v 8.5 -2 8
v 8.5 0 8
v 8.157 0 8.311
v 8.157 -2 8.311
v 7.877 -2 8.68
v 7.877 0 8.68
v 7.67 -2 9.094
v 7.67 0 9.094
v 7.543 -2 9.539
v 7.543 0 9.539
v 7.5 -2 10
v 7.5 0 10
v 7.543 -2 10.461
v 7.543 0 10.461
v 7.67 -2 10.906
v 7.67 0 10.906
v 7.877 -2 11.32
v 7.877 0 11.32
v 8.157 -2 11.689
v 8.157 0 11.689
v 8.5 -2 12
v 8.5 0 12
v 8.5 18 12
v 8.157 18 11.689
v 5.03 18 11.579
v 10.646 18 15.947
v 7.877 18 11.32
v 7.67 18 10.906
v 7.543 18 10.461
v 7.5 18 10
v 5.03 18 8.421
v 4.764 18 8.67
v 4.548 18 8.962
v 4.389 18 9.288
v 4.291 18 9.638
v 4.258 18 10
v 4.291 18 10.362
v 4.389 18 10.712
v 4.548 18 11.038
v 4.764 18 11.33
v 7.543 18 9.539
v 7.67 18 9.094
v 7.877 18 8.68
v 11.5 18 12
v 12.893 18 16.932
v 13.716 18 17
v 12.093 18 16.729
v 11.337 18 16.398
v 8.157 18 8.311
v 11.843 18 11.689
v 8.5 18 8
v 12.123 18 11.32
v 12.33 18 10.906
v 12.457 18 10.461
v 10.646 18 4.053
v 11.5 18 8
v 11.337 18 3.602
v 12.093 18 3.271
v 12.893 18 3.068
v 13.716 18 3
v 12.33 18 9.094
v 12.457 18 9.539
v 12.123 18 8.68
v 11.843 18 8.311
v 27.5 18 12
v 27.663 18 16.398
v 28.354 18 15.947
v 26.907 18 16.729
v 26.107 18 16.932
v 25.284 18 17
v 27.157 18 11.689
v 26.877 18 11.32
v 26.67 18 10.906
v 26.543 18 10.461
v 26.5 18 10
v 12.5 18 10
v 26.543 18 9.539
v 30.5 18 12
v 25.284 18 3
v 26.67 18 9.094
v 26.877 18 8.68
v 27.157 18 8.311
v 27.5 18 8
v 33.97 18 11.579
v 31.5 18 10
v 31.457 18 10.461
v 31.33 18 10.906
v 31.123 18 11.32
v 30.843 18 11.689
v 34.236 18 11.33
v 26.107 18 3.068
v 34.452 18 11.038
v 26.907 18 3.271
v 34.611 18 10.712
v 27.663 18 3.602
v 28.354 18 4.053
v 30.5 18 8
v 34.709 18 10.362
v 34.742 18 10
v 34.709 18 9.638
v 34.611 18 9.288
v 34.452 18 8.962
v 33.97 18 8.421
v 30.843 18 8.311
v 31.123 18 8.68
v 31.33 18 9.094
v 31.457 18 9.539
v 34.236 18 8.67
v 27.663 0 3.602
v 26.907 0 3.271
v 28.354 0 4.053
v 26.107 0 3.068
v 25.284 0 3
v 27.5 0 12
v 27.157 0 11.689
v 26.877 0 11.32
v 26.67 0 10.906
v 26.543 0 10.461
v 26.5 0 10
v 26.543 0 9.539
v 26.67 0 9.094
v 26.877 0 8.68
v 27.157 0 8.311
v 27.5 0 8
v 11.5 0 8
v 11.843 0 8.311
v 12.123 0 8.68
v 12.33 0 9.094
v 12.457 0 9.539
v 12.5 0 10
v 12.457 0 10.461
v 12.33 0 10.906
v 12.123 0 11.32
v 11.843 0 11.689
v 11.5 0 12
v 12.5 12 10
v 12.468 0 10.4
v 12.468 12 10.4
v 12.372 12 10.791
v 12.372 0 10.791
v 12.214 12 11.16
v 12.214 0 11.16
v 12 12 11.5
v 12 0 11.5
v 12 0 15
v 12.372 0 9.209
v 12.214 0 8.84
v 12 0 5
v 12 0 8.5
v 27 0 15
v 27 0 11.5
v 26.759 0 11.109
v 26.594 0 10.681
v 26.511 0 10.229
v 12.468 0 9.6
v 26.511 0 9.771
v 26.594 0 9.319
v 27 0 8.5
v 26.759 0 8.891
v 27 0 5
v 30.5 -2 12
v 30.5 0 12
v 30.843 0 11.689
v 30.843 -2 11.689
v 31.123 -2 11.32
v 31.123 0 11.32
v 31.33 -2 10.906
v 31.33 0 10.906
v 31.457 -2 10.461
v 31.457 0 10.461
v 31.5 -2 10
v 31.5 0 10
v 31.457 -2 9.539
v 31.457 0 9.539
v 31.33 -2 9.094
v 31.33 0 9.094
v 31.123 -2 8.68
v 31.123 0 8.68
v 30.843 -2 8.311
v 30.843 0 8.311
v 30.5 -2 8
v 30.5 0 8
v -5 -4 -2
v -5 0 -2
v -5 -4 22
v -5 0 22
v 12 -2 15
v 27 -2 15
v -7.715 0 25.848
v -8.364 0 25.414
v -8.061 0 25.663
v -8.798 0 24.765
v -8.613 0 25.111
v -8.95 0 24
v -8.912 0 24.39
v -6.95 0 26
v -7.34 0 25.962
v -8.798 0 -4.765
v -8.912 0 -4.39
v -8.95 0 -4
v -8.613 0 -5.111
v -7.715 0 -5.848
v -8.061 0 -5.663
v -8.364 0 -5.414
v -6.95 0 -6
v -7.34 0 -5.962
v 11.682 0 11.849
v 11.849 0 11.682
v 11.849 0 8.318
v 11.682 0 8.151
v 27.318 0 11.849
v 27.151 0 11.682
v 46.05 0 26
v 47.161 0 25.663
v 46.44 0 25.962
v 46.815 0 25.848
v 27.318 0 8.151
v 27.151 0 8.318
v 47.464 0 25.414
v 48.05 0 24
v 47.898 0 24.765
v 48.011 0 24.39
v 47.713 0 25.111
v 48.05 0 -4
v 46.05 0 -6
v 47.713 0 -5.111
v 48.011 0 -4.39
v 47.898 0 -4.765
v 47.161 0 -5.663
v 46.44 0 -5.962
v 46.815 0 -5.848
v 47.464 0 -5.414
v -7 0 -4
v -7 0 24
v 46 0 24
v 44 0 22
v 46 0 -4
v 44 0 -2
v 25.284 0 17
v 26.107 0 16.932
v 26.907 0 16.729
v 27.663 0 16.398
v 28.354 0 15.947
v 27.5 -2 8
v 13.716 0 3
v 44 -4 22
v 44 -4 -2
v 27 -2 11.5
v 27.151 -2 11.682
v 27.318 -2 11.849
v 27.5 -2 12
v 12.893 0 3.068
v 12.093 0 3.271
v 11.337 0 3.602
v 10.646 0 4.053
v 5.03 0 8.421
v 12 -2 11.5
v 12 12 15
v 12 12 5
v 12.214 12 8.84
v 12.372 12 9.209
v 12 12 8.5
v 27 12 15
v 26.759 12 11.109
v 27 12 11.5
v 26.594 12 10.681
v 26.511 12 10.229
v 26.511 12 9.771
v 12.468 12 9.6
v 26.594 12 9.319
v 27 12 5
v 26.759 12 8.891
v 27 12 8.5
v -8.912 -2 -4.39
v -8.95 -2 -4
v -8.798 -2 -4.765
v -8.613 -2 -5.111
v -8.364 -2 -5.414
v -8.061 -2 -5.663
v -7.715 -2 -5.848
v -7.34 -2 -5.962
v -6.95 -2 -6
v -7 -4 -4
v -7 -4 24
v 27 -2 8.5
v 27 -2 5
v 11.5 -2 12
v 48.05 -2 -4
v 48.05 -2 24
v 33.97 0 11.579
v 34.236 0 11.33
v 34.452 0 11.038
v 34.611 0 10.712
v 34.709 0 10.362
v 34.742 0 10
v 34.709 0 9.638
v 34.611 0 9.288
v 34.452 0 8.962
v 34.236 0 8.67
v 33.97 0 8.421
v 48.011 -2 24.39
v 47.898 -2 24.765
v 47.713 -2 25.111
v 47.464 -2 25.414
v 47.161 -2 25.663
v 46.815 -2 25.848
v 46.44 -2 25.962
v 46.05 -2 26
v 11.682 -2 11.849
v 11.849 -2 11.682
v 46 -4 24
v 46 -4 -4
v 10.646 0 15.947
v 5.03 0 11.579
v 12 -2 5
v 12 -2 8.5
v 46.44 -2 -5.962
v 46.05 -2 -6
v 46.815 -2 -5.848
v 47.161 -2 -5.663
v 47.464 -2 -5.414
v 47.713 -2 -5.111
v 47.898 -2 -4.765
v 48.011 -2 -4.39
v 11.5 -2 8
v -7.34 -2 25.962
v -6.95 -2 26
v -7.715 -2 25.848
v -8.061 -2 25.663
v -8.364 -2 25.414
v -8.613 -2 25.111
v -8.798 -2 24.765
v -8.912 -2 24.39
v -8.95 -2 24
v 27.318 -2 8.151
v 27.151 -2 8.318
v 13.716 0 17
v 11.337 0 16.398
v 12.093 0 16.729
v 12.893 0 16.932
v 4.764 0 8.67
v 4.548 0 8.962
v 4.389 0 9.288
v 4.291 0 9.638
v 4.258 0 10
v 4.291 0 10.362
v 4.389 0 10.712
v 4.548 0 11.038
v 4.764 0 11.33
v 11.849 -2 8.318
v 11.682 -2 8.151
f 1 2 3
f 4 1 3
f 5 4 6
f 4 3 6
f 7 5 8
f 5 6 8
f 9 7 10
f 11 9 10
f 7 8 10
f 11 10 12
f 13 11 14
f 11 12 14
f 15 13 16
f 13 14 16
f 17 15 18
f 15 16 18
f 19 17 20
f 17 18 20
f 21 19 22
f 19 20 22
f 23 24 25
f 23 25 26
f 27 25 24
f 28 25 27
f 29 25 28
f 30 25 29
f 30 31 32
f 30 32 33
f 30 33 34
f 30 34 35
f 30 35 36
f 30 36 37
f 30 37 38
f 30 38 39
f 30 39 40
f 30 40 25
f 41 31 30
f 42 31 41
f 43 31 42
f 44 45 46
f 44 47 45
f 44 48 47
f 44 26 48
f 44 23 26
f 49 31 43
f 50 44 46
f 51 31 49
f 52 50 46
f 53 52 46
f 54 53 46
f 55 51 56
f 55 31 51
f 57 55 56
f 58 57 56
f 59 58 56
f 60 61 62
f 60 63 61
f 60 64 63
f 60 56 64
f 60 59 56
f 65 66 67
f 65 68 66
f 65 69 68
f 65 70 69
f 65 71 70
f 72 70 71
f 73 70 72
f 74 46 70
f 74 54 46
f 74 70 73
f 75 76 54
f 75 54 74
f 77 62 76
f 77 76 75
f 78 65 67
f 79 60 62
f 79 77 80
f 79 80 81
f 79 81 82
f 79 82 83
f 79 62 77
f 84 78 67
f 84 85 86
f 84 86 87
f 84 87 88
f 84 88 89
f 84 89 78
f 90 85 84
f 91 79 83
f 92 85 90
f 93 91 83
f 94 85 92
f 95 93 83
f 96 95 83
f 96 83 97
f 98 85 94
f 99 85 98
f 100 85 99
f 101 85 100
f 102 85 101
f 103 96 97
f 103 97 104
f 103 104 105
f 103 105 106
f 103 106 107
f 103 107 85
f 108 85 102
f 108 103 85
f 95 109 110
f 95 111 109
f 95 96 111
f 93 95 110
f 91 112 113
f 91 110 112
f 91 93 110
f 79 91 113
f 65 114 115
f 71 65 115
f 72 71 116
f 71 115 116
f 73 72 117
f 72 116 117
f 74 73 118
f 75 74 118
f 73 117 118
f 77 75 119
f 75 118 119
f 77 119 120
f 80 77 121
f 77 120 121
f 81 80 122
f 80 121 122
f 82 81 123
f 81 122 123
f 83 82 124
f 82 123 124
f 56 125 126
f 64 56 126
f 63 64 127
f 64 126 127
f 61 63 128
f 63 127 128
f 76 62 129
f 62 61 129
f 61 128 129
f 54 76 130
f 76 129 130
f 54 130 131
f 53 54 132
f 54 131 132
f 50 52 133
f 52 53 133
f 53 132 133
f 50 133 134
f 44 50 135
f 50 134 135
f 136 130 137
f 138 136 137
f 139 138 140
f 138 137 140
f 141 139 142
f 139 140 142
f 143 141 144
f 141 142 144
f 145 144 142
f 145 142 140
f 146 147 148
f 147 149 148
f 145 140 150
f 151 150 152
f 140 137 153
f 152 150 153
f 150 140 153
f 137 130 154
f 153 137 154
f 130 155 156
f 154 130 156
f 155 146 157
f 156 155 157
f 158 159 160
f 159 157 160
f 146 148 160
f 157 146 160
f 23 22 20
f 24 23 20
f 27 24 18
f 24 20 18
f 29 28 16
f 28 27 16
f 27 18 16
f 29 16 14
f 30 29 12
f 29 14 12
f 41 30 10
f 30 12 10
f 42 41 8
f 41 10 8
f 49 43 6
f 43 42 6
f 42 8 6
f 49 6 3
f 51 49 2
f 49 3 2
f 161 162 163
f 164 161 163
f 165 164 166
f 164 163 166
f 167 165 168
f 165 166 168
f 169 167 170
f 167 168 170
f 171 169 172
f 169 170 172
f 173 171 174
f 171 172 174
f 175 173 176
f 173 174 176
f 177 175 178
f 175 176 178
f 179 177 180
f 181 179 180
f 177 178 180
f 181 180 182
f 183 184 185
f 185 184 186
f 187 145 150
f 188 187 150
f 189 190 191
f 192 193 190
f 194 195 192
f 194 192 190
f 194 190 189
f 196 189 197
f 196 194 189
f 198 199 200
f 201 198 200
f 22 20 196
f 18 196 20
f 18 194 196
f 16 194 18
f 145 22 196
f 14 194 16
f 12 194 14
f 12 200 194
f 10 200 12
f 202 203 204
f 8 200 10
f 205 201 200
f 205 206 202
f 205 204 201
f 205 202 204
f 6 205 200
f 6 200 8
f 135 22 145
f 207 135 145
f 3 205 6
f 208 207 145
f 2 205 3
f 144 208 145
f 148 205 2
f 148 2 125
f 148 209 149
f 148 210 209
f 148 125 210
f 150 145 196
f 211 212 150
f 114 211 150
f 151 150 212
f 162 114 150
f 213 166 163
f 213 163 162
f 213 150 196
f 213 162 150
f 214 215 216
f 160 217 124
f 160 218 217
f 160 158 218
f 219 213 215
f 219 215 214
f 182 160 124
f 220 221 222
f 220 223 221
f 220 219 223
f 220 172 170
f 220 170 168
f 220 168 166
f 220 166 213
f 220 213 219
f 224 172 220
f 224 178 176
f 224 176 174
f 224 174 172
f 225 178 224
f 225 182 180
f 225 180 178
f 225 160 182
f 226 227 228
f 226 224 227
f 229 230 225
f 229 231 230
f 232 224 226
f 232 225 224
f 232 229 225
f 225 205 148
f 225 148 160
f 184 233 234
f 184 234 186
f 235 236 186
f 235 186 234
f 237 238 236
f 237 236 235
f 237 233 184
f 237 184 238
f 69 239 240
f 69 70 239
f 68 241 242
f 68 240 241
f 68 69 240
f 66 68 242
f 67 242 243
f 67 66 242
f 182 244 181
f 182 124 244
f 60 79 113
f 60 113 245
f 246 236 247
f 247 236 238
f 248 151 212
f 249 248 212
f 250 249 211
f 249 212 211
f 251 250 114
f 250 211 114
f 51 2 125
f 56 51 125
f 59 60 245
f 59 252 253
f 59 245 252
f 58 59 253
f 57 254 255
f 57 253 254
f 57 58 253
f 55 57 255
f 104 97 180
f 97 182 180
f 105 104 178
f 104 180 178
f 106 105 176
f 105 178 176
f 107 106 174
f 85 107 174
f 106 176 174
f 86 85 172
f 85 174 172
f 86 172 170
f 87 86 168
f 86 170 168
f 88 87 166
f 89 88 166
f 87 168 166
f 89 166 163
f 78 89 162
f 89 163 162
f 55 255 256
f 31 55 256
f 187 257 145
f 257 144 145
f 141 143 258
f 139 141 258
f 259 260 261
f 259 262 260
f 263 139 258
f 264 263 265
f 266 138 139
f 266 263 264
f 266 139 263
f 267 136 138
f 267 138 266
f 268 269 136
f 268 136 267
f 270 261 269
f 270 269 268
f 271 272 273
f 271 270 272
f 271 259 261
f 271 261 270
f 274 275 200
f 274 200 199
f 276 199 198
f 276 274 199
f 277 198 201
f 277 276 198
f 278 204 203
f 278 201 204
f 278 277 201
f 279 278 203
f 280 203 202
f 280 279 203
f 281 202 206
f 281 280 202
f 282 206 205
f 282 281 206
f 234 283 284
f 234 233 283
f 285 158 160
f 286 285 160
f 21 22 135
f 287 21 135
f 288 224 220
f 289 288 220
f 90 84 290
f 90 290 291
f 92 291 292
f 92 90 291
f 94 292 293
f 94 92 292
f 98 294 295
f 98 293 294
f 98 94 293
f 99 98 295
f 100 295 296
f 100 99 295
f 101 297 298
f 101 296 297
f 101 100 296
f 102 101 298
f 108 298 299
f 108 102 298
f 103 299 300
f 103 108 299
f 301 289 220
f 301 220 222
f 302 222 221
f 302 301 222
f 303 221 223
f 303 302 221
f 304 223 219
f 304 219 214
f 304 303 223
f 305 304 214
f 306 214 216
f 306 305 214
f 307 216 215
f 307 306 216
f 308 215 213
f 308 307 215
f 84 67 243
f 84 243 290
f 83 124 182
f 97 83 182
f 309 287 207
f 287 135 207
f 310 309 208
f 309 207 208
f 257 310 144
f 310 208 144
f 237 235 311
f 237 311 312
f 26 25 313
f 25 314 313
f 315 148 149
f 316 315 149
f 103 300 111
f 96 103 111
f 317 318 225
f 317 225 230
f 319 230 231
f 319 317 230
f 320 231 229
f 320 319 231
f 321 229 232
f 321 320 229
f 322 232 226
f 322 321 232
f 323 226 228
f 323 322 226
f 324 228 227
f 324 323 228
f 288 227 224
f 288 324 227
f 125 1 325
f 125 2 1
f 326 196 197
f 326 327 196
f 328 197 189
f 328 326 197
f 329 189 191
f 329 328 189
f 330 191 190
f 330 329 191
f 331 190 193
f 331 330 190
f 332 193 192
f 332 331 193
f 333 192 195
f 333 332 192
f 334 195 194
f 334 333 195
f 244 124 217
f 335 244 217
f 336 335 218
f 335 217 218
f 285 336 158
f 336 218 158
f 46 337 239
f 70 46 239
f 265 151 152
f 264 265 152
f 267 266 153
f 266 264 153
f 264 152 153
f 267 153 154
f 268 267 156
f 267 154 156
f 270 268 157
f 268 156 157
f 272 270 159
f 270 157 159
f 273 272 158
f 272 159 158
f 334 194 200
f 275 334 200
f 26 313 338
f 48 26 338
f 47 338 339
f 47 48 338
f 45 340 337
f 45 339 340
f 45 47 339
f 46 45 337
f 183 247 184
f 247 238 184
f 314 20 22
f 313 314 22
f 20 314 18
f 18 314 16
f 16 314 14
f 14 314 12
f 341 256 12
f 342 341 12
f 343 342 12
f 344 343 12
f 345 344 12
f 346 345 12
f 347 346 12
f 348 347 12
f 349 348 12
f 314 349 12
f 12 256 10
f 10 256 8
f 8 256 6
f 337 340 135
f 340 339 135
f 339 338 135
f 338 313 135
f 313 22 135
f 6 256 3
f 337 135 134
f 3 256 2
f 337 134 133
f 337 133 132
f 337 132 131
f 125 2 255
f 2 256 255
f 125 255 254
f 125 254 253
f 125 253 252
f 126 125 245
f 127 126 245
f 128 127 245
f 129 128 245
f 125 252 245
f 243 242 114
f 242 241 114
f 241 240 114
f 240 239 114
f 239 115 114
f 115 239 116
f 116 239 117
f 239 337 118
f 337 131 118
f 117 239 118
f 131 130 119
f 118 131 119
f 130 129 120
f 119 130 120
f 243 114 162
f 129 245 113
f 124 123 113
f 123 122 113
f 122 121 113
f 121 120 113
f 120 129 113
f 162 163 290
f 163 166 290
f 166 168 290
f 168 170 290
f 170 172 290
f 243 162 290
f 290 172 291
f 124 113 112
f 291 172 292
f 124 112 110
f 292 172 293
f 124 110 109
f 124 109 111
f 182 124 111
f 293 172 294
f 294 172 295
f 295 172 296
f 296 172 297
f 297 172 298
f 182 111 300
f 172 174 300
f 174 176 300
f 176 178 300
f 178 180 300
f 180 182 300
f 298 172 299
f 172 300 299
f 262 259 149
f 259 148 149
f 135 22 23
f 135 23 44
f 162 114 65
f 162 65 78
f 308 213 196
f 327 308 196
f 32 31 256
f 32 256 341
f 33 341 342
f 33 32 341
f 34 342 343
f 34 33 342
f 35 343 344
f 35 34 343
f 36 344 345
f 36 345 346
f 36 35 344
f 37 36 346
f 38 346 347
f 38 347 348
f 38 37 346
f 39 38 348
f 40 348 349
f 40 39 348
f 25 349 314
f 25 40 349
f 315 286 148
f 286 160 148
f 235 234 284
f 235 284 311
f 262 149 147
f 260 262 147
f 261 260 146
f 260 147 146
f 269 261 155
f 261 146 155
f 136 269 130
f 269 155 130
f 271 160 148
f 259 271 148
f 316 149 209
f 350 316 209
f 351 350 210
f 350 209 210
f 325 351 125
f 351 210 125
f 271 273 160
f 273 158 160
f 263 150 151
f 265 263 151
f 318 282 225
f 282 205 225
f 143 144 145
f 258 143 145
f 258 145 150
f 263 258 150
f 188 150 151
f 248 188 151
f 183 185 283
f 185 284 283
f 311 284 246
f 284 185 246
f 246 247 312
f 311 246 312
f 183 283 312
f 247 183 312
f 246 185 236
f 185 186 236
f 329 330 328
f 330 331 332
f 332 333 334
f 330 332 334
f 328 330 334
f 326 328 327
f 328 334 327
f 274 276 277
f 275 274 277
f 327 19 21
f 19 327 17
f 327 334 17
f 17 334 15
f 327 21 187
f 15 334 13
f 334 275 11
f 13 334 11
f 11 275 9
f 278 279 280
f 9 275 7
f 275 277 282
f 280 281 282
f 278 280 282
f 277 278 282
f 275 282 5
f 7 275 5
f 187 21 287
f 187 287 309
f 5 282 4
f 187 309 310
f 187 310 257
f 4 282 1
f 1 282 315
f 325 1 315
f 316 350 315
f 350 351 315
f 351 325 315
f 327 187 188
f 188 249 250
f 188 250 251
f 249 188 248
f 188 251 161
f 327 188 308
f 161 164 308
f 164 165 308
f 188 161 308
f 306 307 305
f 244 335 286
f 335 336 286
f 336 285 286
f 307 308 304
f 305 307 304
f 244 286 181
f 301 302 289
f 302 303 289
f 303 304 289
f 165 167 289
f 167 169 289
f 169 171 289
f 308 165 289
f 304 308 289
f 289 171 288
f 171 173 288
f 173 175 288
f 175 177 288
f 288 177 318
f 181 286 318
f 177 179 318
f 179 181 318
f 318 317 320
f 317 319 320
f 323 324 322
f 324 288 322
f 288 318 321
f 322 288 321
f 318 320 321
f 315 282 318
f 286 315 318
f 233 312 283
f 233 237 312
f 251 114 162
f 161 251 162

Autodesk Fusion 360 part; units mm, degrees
sketch "Esquisse1" plane through (0, 0, 0) normal (0, 1, 0) x (1, 0, 0)
  circle A0 centre (10, -10) radius 2.5
  line L0 (8.5, -12) -> (11.5, -12)
  line L1 (8.5, -8) -> (11.5, -8)
  circle A1 centre (29, -10) radius 2.5
  line L2 (27.5, -12) -> (30.5, -12)
  line L3 (27.5, -8) -> (30.5, -8)
  line L4 (-8.9501, 6) -> (48.0499, 6)
  line L5 (48.0499, 6) -> (48.0499, -26)
  line L6 (48.0499, -26) -> (-8.9501, -26)
  line L7 (-8.9501, -26) -> (-8.9501, 6)
  line L8 (-7, -24) -> (46, -24)
  line L9 (46, -24) -> (46, 4)
  line L10 (46, 4) -> (-7, 4)
  line L11 (-7, 4) -> (-7, -24)
  line L12 (-5, -22) -> (44, -22)
  line L13 (44, -22) -> (44, 2)
  line L14 (44, 2) -> (-5, 2)
  line L15 (-5, 2) -> (-5, -22)
  line L16 (10, -12) -> (8.5, -12)
  line L17 (3, -10) -> (12, -17)
  line L18 (12, -17) -> (27, -17)
  line L19 (27, -17) -> (36, -10)
  line L20 (36, -10) -> (27, -3)
  line L21 (27, -3) -> (12, -3)
  line L22 (12, -3) -> (3, -10)
  line L23 (12, -15) -> (27, -15)
  line L24 (27, -15) -> (27, -5)
  line L25 (27, -5) -> (12, -5)
  line L26 (12, -5) -> (12, -15)
extrude "Extrusion40" add sketch "Esquisse1" against normal blind 2 contours A0 L1 | A0 L0 L16 | A1 L3 | A1 L2 | L4 L5 L6 L7 | L8 L9 L10 L11 | L12 L13 L14 L15 | L17 L18 L19 L20 L21 L22 makes body 1
extrude "Extrusion41" add sketch "Esquisse1" against normal blind 4 separate body contours L8 L9 L10 L11 makes body 2
extrude "Extrusion42" add sketch "Esquisse1" along normal blind 18 separate body contours A0 L1 | A0 A1 L23 L24 L25 L26 | A0 L0 L16 | A1 L3 | A1 L2 | L17 L18 L19 L20 L21 L22 makes body 3
extrude "Extrusion43" add sketch "Esquisse1" along normal blind 12 separate body contours A0 A1 L23 L24 L25 L26 makes body 4
fillet "Congé11" radius 5 4 edges at (12, 9, 17) (27, 9, 17) (12, 9, 3) (27, 9, 3) on bodies 3
fillet "Congé12" radius 2 2 edges at (36, 9, 10) (3, 9, 10) on bodies 3
fillet "Congé13" radius 2 4 edges at (48.0499, -1, 26) (48.0499, -1, -6) (-8.9501, -1, -6) (-8.9501, -1, 26) on bodies 1
